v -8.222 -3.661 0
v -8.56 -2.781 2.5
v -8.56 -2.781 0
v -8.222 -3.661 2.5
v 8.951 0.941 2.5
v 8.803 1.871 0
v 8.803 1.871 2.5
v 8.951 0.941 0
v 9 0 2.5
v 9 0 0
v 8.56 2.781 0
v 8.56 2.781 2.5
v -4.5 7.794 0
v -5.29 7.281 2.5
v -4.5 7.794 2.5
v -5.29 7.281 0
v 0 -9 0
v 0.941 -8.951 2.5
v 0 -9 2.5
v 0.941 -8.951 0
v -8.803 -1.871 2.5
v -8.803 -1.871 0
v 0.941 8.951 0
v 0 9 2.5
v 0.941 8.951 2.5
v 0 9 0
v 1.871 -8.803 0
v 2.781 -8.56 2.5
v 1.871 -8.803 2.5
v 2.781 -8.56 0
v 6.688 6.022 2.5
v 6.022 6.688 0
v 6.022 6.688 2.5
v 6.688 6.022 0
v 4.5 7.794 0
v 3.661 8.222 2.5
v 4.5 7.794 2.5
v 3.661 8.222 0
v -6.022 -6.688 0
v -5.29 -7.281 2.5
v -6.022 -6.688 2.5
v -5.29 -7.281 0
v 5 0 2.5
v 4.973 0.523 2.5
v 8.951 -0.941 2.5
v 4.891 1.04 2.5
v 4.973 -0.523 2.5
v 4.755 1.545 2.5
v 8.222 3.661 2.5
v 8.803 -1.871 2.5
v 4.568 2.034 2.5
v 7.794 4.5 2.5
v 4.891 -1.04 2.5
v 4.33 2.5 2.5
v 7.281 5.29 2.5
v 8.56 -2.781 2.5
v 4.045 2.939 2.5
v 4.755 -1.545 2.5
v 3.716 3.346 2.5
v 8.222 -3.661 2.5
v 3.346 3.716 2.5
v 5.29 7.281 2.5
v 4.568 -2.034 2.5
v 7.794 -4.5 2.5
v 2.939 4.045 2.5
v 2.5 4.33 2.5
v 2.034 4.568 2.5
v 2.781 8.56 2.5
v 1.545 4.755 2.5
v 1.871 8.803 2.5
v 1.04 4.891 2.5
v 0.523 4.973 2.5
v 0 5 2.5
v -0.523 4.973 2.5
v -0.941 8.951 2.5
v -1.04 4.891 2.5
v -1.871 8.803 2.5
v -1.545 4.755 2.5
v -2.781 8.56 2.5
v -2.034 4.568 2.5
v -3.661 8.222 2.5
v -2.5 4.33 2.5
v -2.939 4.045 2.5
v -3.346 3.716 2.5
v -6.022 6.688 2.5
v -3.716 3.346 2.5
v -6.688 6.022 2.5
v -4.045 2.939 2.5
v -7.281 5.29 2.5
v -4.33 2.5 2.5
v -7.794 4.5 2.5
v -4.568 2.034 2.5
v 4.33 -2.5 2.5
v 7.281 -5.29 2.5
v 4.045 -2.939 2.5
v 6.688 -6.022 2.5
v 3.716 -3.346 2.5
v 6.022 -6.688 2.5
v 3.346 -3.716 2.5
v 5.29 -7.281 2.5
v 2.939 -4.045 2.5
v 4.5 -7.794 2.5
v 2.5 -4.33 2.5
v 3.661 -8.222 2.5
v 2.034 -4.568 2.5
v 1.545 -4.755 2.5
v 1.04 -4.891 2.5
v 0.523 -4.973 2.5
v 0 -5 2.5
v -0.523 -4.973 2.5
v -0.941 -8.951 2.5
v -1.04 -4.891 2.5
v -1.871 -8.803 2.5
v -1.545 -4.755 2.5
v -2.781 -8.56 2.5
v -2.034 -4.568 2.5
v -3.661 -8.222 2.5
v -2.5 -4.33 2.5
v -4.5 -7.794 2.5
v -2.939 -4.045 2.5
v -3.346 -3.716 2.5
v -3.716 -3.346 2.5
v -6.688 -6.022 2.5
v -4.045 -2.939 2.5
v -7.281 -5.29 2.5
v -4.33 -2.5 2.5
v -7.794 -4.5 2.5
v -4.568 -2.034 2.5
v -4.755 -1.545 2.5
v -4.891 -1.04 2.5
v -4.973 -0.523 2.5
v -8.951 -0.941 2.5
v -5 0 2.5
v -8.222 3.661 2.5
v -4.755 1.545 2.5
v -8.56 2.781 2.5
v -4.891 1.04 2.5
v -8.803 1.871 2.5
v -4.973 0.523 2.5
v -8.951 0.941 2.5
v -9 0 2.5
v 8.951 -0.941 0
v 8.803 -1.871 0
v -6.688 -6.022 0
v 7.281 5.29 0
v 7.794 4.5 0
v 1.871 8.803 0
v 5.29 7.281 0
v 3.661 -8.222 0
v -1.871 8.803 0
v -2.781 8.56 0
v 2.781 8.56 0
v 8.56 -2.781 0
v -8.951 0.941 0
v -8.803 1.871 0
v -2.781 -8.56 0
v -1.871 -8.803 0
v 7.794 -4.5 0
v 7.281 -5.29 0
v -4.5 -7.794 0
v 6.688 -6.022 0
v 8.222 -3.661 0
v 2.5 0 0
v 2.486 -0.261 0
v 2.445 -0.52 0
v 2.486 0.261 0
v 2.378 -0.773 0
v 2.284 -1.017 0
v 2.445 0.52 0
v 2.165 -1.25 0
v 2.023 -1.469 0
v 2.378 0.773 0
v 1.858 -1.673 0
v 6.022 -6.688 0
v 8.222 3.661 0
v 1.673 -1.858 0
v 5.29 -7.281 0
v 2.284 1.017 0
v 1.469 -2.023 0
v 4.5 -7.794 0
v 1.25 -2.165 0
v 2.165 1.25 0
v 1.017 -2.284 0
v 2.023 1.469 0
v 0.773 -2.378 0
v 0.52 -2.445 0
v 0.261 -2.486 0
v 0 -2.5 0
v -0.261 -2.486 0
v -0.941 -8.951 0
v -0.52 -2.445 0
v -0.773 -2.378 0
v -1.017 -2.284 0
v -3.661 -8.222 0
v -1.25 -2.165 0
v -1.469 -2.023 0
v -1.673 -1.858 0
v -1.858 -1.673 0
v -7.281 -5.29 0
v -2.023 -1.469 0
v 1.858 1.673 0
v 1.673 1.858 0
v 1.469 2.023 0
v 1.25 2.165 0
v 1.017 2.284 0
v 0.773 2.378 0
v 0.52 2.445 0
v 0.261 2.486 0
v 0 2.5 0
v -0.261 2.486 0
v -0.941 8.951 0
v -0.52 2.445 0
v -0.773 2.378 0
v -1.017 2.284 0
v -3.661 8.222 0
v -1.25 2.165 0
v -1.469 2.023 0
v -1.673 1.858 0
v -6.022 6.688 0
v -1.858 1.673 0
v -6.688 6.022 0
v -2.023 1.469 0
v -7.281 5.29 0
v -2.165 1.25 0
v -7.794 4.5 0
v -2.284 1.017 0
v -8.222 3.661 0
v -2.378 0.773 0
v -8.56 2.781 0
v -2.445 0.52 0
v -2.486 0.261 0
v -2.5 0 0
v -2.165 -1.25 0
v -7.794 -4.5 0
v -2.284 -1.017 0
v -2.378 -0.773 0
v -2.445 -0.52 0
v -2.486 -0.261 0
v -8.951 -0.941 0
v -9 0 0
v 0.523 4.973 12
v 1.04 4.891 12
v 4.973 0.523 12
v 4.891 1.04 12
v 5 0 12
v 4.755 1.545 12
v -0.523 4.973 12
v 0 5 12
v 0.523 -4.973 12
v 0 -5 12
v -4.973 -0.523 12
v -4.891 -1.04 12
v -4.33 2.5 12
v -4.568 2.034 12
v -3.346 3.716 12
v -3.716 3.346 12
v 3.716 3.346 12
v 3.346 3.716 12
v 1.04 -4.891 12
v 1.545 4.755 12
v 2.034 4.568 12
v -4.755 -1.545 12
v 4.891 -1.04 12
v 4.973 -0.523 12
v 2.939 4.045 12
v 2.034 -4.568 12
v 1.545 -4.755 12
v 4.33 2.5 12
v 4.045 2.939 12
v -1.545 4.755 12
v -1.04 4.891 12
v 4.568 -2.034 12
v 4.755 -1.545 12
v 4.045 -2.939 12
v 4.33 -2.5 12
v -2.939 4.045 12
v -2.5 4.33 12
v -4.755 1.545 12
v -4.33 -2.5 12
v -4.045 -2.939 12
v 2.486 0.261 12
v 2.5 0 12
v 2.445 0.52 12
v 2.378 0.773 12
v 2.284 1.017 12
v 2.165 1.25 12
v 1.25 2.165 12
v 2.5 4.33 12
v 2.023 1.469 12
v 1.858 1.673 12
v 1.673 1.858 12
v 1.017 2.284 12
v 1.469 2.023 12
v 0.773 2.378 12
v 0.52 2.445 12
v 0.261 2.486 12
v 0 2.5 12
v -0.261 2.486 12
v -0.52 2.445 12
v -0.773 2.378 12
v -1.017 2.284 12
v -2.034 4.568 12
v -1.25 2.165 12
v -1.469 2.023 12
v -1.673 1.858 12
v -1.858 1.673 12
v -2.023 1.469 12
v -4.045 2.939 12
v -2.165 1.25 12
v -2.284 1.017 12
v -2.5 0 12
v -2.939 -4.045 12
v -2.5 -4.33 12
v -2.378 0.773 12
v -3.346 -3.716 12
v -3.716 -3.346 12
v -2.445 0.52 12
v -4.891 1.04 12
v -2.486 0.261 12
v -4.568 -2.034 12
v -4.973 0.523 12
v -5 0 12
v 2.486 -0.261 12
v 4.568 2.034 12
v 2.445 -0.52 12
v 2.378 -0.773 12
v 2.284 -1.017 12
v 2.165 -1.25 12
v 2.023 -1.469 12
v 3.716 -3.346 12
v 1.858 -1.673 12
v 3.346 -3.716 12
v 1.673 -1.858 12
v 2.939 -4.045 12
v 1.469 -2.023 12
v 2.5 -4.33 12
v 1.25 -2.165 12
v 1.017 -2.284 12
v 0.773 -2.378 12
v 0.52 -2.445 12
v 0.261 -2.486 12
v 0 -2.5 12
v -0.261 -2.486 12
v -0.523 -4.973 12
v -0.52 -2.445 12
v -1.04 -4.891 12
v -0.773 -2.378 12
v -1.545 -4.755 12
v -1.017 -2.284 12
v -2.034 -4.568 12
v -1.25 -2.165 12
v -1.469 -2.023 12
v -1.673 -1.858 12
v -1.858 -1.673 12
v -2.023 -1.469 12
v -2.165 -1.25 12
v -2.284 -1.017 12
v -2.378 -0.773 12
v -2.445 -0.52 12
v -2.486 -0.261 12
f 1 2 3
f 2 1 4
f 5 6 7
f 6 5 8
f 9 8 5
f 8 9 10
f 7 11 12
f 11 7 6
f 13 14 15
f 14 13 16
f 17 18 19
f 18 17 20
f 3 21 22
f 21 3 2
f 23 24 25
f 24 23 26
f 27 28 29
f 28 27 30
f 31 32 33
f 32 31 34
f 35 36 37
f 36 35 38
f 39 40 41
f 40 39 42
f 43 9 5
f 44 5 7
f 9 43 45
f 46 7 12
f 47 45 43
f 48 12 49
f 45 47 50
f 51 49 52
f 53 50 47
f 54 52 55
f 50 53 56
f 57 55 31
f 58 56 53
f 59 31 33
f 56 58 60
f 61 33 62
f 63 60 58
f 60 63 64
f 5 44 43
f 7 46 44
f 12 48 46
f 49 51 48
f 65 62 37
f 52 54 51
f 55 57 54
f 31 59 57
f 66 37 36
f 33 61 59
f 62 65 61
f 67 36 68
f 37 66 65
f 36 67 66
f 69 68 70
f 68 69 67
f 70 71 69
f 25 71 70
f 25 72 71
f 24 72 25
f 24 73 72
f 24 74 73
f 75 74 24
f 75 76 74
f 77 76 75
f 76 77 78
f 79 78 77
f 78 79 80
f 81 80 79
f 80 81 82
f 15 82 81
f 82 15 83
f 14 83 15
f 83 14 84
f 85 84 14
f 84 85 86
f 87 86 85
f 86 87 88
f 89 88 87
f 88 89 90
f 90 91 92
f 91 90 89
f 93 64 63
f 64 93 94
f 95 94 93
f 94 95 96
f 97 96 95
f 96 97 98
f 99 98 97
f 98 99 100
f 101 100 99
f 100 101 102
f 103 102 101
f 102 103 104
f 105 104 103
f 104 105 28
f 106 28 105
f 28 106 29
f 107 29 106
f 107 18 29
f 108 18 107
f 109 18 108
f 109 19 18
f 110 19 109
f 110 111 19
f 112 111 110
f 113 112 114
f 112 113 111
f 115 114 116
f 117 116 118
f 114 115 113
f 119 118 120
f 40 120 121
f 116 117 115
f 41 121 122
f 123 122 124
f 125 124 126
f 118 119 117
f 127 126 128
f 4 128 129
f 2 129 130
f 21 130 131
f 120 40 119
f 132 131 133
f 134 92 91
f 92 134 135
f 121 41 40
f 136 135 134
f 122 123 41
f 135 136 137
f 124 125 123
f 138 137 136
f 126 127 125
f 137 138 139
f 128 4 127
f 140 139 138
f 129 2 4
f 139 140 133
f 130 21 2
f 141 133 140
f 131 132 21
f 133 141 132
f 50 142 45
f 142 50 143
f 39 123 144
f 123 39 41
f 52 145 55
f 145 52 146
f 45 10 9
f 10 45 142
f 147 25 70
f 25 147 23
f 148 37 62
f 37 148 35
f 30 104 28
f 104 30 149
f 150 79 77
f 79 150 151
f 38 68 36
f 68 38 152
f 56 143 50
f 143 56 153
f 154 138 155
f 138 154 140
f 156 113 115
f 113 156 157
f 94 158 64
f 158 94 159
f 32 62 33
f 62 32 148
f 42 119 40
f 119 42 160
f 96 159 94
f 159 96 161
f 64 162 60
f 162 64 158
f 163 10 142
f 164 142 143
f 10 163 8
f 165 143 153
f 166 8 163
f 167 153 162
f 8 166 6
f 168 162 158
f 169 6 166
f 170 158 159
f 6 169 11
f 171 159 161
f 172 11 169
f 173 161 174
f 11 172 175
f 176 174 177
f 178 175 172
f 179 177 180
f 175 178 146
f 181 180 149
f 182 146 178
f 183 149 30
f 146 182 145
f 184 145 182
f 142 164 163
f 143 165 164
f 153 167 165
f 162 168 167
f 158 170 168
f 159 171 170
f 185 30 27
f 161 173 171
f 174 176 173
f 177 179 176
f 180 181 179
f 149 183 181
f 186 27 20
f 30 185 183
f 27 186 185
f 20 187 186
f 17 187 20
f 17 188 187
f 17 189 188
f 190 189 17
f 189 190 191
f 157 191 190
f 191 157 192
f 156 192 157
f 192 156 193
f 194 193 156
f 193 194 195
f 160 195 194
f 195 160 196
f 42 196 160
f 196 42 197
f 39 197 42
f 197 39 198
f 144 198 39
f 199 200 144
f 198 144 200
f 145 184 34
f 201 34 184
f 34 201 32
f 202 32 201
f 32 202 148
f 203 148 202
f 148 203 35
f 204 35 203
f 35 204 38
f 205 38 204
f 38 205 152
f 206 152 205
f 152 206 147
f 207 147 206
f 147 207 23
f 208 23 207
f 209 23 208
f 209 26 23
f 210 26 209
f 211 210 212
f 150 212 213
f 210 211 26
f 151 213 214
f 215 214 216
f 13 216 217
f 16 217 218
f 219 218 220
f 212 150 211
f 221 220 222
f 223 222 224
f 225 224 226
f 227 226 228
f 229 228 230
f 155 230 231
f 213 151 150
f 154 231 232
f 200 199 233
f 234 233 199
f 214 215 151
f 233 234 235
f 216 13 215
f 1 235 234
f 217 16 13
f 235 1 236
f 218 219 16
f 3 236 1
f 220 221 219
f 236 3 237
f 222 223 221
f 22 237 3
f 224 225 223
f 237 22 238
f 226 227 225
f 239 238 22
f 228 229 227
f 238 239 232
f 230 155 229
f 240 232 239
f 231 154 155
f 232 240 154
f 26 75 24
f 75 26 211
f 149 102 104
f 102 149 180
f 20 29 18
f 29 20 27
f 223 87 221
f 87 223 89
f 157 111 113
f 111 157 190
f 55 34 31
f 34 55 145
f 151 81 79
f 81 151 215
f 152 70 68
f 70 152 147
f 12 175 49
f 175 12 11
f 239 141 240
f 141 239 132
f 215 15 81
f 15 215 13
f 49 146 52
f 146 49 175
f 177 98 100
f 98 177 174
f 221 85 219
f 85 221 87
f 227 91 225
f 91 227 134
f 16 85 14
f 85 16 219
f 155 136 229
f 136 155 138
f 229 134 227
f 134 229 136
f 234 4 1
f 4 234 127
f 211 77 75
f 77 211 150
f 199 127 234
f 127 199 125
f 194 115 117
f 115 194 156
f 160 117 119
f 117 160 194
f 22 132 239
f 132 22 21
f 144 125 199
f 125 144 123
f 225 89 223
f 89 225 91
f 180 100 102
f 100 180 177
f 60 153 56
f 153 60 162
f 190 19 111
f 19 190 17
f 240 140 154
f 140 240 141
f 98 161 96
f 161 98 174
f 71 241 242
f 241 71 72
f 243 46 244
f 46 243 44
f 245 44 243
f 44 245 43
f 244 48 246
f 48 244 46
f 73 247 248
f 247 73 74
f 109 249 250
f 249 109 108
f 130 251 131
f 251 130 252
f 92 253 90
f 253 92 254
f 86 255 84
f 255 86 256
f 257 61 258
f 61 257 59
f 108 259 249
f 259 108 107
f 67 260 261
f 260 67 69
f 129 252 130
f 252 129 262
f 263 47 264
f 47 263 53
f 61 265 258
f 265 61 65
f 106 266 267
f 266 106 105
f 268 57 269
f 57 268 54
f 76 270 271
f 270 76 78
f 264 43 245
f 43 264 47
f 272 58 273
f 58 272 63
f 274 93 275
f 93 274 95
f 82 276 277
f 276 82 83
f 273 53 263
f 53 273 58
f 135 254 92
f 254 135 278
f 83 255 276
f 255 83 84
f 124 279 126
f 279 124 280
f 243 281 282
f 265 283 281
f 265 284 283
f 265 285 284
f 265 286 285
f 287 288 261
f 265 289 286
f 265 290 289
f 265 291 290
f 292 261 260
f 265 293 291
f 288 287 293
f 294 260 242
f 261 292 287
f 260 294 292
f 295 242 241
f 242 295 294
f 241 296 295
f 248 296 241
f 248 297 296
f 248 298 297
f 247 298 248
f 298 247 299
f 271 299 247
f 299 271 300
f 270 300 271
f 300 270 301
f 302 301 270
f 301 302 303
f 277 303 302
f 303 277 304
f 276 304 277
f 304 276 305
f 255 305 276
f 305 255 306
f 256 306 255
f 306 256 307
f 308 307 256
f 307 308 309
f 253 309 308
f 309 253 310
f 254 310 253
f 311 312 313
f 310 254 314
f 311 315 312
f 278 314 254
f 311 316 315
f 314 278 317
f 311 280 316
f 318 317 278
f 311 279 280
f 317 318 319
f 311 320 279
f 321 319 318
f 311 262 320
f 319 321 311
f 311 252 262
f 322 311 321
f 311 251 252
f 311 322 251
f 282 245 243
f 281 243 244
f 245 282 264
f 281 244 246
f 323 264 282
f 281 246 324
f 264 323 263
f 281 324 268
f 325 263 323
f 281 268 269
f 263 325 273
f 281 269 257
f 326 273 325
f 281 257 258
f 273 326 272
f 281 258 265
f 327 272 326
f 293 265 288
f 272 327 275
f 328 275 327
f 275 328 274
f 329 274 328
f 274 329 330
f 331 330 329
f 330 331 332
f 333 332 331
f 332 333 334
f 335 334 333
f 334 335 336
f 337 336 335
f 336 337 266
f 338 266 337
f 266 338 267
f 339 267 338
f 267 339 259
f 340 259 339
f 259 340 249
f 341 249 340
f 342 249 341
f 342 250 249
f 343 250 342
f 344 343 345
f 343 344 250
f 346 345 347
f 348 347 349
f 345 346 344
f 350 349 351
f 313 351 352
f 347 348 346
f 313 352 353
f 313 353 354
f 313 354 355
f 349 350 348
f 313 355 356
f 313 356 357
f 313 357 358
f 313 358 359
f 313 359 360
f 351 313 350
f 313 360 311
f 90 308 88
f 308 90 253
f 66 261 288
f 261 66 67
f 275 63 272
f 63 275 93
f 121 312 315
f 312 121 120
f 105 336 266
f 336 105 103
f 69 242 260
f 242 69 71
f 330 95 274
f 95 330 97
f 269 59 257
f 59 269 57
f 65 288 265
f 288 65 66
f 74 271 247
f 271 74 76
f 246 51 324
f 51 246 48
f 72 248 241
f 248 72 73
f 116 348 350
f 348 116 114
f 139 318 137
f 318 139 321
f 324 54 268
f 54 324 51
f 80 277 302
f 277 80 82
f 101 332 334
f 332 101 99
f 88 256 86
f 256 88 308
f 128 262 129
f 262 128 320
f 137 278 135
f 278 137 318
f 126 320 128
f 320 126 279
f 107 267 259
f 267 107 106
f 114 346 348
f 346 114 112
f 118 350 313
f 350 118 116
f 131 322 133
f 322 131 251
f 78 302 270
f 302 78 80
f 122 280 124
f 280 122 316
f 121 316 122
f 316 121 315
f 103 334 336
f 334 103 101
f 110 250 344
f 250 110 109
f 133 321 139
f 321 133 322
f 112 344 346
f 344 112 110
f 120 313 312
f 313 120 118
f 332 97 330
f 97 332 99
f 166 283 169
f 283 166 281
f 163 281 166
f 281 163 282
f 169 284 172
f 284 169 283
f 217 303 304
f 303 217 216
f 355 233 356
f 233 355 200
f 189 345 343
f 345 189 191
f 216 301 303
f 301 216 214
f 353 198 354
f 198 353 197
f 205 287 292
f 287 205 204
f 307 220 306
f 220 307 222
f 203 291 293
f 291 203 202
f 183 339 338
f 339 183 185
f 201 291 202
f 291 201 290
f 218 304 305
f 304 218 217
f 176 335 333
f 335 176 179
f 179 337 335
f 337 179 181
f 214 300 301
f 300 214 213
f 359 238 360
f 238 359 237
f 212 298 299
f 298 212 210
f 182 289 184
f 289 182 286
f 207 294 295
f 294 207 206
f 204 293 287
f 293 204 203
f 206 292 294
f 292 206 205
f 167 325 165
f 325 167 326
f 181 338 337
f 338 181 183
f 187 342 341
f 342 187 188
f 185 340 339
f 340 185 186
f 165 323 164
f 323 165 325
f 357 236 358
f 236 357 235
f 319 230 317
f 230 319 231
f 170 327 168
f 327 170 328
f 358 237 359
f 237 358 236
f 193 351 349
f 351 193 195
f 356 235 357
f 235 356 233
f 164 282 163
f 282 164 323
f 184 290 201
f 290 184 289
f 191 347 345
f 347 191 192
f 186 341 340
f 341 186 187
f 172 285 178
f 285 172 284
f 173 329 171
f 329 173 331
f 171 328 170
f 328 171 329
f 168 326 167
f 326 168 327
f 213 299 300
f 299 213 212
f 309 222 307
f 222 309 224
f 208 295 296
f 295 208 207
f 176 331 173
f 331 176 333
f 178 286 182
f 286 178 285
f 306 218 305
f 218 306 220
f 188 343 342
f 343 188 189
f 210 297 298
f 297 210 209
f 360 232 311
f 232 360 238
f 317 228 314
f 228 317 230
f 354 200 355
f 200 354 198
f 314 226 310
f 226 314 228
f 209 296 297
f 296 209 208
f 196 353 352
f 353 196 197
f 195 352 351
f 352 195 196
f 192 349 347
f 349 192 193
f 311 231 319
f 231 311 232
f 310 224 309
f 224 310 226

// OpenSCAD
// Flanged sleeve bushing.
$fn = 60;
eps = 0.02;
inner_d = 5;
outer_d = 10;
length = 12;
flange_d = 18;
flange_t = 2.5;
difference() {
    union() {
        cylinder(d = flange_d, h = flange_t);
        cylinder(d = outer_d, h = length);
    }
    translate([0, 0, -eps]) cylinder(d = inner_d, h = length + 2 * eps);
}
